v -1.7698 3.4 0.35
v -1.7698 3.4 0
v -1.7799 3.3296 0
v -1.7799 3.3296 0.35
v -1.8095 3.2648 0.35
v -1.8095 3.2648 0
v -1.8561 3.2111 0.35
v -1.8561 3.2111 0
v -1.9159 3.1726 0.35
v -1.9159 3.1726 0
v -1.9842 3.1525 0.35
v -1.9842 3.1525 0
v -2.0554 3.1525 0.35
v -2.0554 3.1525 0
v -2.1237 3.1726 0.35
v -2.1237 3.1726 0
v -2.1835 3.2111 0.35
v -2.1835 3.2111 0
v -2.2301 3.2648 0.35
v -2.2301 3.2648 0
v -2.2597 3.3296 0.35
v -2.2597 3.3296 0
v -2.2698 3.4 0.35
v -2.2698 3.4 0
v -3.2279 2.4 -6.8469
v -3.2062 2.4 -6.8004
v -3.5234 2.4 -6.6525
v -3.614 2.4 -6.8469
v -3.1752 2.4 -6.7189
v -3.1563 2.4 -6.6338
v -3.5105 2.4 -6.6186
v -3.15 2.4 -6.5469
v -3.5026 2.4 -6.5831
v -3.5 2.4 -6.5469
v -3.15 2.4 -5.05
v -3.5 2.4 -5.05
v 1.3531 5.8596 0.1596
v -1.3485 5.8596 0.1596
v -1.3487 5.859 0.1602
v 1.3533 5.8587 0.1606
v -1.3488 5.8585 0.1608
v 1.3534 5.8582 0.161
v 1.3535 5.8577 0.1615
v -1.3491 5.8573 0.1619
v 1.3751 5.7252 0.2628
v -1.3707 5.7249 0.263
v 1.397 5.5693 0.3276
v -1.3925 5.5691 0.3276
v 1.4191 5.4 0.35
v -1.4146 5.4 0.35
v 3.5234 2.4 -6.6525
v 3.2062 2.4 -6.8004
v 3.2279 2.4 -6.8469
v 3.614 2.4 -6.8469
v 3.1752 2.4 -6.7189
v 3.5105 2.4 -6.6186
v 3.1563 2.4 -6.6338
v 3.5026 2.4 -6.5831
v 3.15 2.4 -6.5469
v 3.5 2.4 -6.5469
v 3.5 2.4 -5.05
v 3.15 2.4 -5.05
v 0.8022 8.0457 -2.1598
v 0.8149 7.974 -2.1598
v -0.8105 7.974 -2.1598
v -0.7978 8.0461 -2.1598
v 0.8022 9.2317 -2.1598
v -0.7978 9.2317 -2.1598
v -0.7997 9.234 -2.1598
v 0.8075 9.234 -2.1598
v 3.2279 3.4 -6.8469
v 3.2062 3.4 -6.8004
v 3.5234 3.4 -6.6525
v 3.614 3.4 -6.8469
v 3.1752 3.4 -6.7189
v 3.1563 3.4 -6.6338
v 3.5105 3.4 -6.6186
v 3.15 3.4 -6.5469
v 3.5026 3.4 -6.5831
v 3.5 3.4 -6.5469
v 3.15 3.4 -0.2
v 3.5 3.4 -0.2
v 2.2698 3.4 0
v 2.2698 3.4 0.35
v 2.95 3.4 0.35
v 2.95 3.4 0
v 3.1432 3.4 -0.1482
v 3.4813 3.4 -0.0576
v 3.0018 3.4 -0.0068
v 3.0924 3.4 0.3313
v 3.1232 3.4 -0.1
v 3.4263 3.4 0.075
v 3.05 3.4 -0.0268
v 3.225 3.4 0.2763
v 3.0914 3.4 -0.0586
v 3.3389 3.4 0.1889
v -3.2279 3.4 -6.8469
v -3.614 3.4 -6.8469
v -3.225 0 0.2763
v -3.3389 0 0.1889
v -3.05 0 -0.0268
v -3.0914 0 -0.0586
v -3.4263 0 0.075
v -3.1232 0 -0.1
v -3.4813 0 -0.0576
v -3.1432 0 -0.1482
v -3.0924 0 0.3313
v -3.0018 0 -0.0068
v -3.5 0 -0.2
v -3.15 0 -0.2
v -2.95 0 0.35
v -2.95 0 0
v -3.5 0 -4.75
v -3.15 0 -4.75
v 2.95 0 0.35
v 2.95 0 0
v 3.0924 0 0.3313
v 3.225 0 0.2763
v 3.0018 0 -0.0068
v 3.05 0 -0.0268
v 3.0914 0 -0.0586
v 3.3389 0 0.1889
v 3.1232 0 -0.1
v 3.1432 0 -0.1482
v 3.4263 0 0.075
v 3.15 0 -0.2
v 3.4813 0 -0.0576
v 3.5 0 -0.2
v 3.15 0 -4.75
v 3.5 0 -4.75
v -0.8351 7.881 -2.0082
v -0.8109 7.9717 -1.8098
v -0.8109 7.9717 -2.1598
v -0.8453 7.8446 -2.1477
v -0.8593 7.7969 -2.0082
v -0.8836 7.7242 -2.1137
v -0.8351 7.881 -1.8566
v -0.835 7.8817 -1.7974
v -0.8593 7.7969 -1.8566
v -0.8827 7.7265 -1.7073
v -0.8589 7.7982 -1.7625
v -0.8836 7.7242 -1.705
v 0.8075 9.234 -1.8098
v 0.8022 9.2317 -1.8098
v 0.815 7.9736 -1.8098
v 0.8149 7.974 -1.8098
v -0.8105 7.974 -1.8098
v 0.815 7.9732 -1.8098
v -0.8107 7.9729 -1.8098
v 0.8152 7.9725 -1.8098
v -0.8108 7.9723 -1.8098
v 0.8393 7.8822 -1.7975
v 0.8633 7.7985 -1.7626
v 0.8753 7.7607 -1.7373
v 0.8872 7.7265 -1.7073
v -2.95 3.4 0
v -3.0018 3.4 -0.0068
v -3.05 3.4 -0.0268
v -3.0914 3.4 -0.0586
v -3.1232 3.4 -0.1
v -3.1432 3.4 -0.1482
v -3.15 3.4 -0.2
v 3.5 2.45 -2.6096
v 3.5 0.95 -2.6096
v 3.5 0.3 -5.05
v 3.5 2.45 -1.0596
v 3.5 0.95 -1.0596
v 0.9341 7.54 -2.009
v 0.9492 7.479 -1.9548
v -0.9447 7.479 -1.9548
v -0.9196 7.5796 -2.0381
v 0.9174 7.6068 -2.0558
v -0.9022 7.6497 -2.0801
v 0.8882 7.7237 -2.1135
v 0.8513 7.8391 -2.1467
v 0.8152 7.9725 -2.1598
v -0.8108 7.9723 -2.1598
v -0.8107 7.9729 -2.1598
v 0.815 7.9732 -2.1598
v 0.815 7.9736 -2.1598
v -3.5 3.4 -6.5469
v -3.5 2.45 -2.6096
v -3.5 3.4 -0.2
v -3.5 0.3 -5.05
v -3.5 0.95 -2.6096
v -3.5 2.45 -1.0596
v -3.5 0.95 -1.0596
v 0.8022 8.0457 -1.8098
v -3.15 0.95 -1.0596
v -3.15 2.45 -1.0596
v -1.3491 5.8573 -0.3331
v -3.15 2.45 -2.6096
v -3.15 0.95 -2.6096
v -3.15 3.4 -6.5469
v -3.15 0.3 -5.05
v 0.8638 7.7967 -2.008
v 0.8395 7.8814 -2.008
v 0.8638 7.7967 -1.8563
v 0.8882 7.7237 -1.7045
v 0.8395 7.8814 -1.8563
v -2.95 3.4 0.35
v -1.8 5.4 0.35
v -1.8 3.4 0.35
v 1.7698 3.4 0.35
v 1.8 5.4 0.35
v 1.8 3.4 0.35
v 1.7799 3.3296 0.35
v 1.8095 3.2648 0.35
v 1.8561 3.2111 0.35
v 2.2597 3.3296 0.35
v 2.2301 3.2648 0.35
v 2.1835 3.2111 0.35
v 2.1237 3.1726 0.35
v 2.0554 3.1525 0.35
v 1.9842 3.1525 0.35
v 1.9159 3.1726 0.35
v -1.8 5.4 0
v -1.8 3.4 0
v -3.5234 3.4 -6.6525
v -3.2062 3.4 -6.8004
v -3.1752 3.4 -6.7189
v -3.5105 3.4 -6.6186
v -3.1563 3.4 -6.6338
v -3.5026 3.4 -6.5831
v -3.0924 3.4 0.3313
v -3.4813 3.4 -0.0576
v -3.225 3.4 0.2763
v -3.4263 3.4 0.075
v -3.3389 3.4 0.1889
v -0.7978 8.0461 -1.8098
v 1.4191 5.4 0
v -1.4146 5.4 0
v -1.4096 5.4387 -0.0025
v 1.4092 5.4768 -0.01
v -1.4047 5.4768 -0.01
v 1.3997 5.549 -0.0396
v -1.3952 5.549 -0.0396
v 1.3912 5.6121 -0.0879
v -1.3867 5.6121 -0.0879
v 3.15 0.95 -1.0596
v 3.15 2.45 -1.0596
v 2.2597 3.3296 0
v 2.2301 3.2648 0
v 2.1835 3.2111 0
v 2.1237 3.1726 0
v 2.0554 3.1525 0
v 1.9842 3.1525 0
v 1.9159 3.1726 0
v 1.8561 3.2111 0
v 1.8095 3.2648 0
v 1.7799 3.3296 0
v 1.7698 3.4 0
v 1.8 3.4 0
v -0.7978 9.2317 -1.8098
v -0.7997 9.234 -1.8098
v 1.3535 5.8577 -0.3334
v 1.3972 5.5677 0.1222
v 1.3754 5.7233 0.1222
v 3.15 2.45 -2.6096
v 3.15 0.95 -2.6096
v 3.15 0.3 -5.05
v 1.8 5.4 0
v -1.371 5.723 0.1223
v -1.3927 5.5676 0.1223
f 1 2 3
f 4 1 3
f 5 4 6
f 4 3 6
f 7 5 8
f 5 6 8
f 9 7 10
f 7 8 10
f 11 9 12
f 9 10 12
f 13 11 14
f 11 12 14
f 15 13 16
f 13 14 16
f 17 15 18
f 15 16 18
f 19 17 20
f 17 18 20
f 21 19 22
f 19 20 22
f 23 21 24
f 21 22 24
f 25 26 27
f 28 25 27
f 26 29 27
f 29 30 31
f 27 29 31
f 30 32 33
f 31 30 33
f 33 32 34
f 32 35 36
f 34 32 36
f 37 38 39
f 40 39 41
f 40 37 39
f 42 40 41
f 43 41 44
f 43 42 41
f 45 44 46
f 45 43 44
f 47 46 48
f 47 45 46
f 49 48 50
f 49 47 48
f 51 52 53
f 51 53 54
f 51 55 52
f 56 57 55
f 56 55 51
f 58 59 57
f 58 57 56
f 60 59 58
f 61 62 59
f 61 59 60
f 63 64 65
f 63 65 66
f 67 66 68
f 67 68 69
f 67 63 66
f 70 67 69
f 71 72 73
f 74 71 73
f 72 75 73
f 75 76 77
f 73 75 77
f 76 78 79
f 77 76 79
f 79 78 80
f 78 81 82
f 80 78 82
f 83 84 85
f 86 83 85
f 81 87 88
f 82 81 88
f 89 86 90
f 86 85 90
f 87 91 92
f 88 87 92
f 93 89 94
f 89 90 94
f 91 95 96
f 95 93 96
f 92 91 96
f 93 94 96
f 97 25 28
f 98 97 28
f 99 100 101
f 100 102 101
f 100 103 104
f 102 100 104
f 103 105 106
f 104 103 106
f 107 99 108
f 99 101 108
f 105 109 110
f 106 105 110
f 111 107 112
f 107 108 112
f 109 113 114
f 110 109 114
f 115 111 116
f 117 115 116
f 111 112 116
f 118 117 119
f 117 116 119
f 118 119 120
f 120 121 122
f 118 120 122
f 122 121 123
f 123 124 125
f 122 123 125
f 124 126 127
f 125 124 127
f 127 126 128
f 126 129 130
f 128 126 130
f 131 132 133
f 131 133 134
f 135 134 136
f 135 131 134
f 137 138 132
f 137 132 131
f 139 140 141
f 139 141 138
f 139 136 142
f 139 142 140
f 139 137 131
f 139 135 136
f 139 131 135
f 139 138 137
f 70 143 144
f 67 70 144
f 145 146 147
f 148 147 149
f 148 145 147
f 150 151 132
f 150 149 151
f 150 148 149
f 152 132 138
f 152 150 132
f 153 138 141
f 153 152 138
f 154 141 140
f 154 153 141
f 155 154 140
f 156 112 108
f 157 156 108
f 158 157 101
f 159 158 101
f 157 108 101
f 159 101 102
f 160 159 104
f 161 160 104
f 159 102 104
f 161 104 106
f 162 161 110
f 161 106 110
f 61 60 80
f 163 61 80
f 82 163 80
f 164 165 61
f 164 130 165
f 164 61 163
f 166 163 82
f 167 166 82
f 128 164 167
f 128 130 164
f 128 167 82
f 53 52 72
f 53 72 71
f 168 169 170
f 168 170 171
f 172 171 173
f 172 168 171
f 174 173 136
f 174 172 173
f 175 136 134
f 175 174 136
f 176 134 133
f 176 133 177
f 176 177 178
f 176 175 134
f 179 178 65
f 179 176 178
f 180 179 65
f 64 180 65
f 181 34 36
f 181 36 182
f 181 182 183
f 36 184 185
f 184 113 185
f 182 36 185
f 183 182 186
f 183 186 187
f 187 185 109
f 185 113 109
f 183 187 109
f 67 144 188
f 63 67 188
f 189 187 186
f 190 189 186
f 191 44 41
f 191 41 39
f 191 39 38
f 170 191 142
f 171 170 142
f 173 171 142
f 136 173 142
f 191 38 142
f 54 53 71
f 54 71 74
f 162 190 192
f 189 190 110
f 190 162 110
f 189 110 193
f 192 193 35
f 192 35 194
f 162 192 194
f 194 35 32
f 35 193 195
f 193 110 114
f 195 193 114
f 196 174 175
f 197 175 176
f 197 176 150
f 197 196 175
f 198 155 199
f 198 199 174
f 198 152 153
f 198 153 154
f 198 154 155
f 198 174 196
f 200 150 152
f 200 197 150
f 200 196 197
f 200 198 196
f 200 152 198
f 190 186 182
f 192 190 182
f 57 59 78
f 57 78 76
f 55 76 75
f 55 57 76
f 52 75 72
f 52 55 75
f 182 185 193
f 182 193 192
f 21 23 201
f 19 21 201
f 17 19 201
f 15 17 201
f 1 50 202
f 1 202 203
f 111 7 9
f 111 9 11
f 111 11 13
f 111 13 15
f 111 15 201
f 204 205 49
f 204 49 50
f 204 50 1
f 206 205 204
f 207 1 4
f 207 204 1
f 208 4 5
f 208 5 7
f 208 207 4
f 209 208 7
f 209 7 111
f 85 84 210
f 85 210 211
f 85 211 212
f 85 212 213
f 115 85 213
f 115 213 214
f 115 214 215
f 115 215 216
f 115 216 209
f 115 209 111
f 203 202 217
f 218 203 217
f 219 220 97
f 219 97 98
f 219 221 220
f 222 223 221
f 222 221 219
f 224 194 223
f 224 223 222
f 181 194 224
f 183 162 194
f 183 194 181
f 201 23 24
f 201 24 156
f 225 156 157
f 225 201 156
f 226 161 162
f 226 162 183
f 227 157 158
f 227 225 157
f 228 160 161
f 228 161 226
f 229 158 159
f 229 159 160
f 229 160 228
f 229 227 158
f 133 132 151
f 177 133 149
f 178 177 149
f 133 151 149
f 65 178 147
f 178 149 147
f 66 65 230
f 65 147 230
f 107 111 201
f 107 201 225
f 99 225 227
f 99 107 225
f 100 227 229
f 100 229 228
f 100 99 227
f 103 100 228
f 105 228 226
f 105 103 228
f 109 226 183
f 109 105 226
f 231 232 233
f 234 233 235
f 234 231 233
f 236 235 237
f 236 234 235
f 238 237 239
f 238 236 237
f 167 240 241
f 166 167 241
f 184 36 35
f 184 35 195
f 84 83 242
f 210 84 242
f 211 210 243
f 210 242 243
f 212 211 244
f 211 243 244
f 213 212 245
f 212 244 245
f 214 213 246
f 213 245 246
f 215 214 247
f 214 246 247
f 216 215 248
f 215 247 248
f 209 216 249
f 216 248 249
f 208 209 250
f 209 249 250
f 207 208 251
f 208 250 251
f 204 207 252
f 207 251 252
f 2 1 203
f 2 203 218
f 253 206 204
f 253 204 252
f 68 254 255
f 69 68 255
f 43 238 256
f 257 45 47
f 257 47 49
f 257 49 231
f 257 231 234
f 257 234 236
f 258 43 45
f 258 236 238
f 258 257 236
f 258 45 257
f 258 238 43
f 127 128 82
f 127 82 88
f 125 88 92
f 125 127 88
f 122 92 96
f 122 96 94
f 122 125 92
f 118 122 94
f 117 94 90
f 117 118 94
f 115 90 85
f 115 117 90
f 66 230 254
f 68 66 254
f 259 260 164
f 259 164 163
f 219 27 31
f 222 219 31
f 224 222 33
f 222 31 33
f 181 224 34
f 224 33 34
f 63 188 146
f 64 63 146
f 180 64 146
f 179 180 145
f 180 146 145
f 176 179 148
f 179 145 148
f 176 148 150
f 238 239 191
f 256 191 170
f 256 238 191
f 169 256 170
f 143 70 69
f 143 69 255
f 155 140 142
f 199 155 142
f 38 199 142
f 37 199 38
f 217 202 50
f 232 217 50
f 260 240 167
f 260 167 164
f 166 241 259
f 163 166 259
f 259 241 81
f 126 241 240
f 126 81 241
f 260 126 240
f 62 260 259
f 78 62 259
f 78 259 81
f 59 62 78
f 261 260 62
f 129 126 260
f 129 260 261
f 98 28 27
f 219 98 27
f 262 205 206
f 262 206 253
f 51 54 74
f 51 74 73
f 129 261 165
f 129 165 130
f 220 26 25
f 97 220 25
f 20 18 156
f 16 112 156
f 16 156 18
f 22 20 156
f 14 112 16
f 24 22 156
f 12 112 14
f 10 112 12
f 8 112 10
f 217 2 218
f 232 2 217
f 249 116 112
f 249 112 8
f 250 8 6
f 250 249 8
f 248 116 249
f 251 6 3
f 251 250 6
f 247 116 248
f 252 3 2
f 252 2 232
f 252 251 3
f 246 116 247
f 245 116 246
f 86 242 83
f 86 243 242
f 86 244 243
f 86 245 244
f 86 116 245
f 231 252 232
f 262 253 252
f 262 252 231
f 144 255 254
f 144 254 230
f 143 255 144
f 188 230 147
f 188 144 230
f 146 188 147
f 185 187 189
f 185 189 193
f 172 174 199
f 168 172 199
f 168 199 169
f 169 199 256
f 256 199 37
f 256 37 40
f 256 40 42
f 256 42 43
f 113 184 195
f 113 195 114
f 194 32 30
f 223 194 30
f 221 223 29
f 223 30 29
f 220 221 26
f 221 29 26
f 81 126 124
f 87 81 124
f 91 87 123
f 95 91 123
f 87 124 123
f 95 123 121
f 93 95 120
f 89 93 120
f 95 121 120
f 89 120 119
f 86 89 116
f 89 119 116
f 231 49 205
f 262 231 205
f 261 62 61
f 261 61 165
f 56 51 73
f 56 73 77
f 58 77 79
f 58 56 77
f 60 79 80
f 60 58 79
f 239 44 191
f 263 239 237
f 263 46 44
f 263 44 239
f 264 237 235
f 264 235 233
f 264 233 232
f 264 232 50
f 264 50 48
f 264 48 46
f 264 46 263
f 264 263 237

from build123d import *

# Parameters (mm, degrees)
DODANIE_WYCI_GNI_CIE1_DEPTH     = 0.35
DODANIE_WYCI_GNI_CIE2_DEPTH     = 3.4
WYTNIJ_WYCI_GNI_CIE1_DEPTH      = 12.253852902
WYTNIJ_WYCI_GNI_CIE1_DEPTH_BACK = 12.253852902
SZKIC3_W                        = 1.55
SZKIC3_H                        = 1.5
KONWERTUJ_BRY_1_DEPTH           = 3.4
KONWERTUJ_BRY_1_2_DEPTH         = 3.4
DODANIE_WYCI_GNI_CIE3_DEPTH     = 1
DODANIE_WYCI_GNI_CIE4_START     = -1.7
DODANIE_WYCI_GNI_CIE4_DEPTH     = 3.6
WYTNIJ_WYCI_GNI_CIE2_DEPTH      = 13.252457687


# Read off the part's stored shape, not the designer's step: Konwertuj bryłę1
with BuildPart() as part:
    # Szkic1 → Dodanie-wyciągnięcie1 (new body)
    with BuildSketch(Plane.XY):
        with BuildLine():
            Line((3.5, 0), (3.5, 3.4))
            Line((3.5, 3.4), (3.1, 3.4))
            Line((3.1, 3.4), (2.269798394, 3.4))
            ThreePointArc((2.269798394, 3.4), (2.019798394, 3.15), (1.769798394, 3.4))
            Line((1.769798394, 3.4), (1.417144432, 5.4))
            Line((1.417144432, 5.4), (-1.417144432, 5.4))
            Line((-1.417144432, 5.4), (-1.769798394, 3.4))
            ThreePointArc((-1.769798394, 3.4), (-2.019798394, 3.15), (-2.269798394, 3.4))
            Line((-2.269798394, 3.4), (-3.1, 3.4))
            Line((-3.1, 3.4), (-3.5, 3.4))
            Line((-3.5, 3.4), (-3.5, 0))
            Line((-3.5, 0), (-3.1, 0))
            Line((-3.1, 0), (3.1, 0))
            Line((3.1, 0), (3.5, 0))
        make_face()
    extrude(amount=DODANIE_WYCI_GNI_CIE1_DEPTH)

    # Szkic2 → Dodanie-wyciągnięcie2 (add)
    with BuildSketch(Plane.XZ):
        with BuildLine():
            Line((3.15, -5.046862694), (3.15, -6.546862697))
            ThreePointArc((3.15, -6.546862697), (3.164222396, -6.676726465), (3.206215328, -6.800433654))
            Line((3.206215328, -6.800433654), (3.227865546, -6.846862697))
            Line((3.227865546, -6.846862697), (3.614047818, -6.846862697))
            Line((3.614047818, -6.846862697), (3.523423053, -6.652517262))
            ThreePointArc((3.523423053, -6.652517262), (3.505925998, -6.6009726), (3.5, -6.546862697))
            Line((3.5, -6.546862697), (3.5, -5.046862694))
            Line((3.5, -5.046862694), (3.5, -4.746862694))
            Line((3.5, -4.746862694), (3.5, -0.046862697))
            Line((3.5, -0.046862697), (3.5, 0))
            Line((3.5, 0), (3.15, 0))
            Line((3.15, 0), (3.15, -0.046862697))
            Line((3.15, -0.046862697), (3.15, -4.746862694))
            Line((3.15, -4.746862694), (3.15, -5.046862694))
        make_face()
    dodanie_wyci_gni_cie2 = extrude(amount=-DODANIE_WYCI_GNI_CIE2_DEPTH)

    # Lustro1: Dodanie-wyciągnięcie2 across plane
    add(dodanie_wyci_gni_cie2.mirror(Plane(origin=(0, 0, 0), x_dir=(0, 0, 1), z_dir=(1, 0, 0))))

    # Szkic3 → Wytnij-wyciągnięcie1 (cut, two sides: drawn at the far end of the back side and taken through both)
    with BuildSketch(Plane(origin=(3.5, 0, 0), x_dir=(0, 0, -1), z_dir=(1, 0, 0)).offset(-WYTNIJ_WYCI_GNI_CIE1_DEPTH_BACK)):
        with Locations((1.834568124, 1.7)):
            Rectangle(SZKIC3_W, SZKIC3_H)
        Polygon((6.85, 2.4), (6.655654565, 2.4), (6.55, 2.4), (6.546862697, 2.4), (6.546862697, 0), (4.749999997, 0), (4.618517663, -2.046100673), (8.285753876, -1.25448224), align=None)
        Polygon((6.546862697, 0), (6.546862697, 2.4), (5.049999997, 2.4), (5.049999997, 0.3), (4.749999997, 0), align=None)
    extrude(amount=WYTNIJ_WYCI_GNI_CIE1_DEPTH + WYTNIJ_WYCI_GNI_CIE1_DEPTH_BACK, mode=Mode.SUBTRACT)

    # Konwertuj bryłę1 outline → Konwertuj bryłę1 (cut)
    with BuildSketch(Plane(origin=(0, 0, 0), x_dir=(1, 0, 0), z_dir=(0, 1, 0))):
        with BuildLine():
            Line((3.15, 6.546862697), (3.5, 6.546862697))
            ThreePointArc((3.5, 6.546862697), (3.505925998, 6.6009726), (3.523423053, 6.652517262))
            Line((3.523423053, 6.652517262), (3.614047818, 6.846862697))
            Line((3.614047818, 6.846862697), (3.227865546, 6.846862697))
            Line((3.227865546, 6.846862697), (3.206215328, 6.800433654))
            ThreePointArc((3.206215328, 6.800433654), (3.164222396, 6.676726465), (3.15, 6.546862697))
        make_face()
        with BuildLine():
            Line((3.5, -0.35), (3.5, 0.2))
            ThreePointArc((3.5, 0.2), (3.33890873, -0.18890873), (2.95, -0.35))
            Line((2.95, -0.35), (3.5, -0.35))
        make_face()
        with BuildLine():
            Line((-3.5, -0.35), (-2.95, -0.35))
            ThreePointArc((-2.95, -0.35), (-3.33890873, -0.18890873), (-3.5, 0.2))
            Line((-3.5, 0.2), (-3.5, -0.35))
        make_face()
        with BuildLine():
            ThreePointArc((-3.523423053, 6.652517262), (-3.505925998, 6.6009726), (-3.5, 6.546862697))
            Line((-3.5, 6.546862697), (-3.15, 6.546862697))
            ThreePointArc((-3.15, 6.546862697), (-3.164222396, 6.676726465), (-3.206215328, 6.800433654))
            Line((-3.206215328, 6.800433654), (-3.227865546, 6.846862697))
            Line((-3.227865546, 6.846862697), (-3.614047818, 6.846862697))
            Line((-3.614047818, 6.846862697), (-3.523423053, 6.652517262))
        make_face()
    extrude(amount=KONWERTUJ_BRY_1_DEPTH, mode=Mode.SUBTRACT)

    # Konwertuj bry_1 2 outline → Konwertuj bry_1 2 (add)
    with BuildSketch(Plane(origin=(0, 0, 0), x_dir=(1, 0, 0), z_dir=(0, 1, 0))):
        with BuildLine():
            Line((3.15, 0), (3.15, 0.2))
            ThreePointArc((3.15, 0.2), (3.091421356, 0.058578644), (2.95, 0))
            Line((2.95, 0), (3.15, 0))
        make_face()
        with BuildLine():
            Line((-3.15, 0), (-2.95, 0))
            ThreePointArc((-2.95, 0), (-3.091421356, 0.058578644), (-3.15, 0.2))
            Line((-3.15, 0.2), (-3.15, 0))
        make_face()
    extrude(amount=KONWERTUJ_BRY_1_2_DEPTH)

    # Szkic8 → Dodanie-wyciągnięcie3 (add)
    with BuildSketch(Plane.XZ.offset(-2.4)):
        with BuildLine():
            Line((3.206215328, -6.800433654), (3.227865546, -6.846862697))
            Line((3.227865546, -6.846862697), (3.614047818, -6.846862697))
            Line((3.614047818, -6.846862697), (3.523423053, -6.652517262))
            ThreePointArc((3.523423053, -6.652517262), (3.505925998, -6.6009726), (3.5, -6.546862697))
            Line((3.5, -6.546862697), (3.15, -6.546862697))
            ThreePointArc((3.15, -6.546862697), (3.164222396, -6.676726465), (3.206215328, -6.800433654))
        make_face()
    dodanie_wyci_gni_cie3 = extrude(amount=-DODANIE_WYCI_GNI_CIE3_DEPTH)

    # Lustro2: Dodanie-wyciągnięcie3 across plane
    add(dodanie_wyci_gni_cie3.mirror(Plane(origin=(0, 0, 0), x_dir=(0, 0, 1), z_dir=(1, 0, 0))))

    # Szkic9 → Dodanie-wyciągnięcie4 (add)
    with BuildSketch(Plane(origin=(3.5, 0, 0), x_dir=(0, 0, -1), z_dir=(1, 0, 0)).offset(DODANIE_WYCI_GNI_CIE4_START)):
        with BuildLine():
            Line((2.159795211, 8.048412492), (2.159795211, 9.233988579))
            Line((2.159795211, 9.233988579), (1.809795211, 9.233988579))
            Line((1.809795211, 9.233988579), (1.809795211, 8.048412492))
            Line((1.809795211, 8.048412492), (1.809795211, 7.974008773))
            ThreePointArc((1.809795211, 7.974008773), (1.783153047, 7.840069572), (1.707282584, 7.7265214))
            Line((1.707282584, 7.7265214), (-0.159619408, 5.859619408))
            ThreePointArc((-0.159619408, 5.859619408), (-0.300521696, 5.648744231), (-0.35, 5.4))
            Line((-0.35, 5.4), (-0.35, 3.4))
            Line((-0.35, 3.4), (0, 3.4))
            Line((0, 3.4), (0, 5.4))
            ThreePointArc((0, 5.4), (0.02283614, 5.51480503), (0.087867966, 5.612132034))
            Line((0.087867966, 5.612132034), (1.954769957, 7.479034026))
            ThreePointArc((1.954769957, 7.479034026), (2.106510883, 7.70613037), (2.159795211, 7.974008773))
            Line((2.159795211, 7.974008773), (2.159795211, 8.048412492))
        make_face()
    extrude(amount=-DODANIE_WYCI_GNI_CIE4_DEPTH)

    # Szkic10 → Wytnij-wyciągnięcie2 (cut, through all)
    with BuildSketch(Plane.XY.offset(0.35)):
        with BuildLine():
            Line((-1.8, 5.4), (-1.414602313, 5.4))
            add(Edge.make_bspline(
                [(-1.349117856, 5.857315964), (-1.37109798, 5.736696856), (-1.392626241, 5.570542489), (-1.414602313, 5.4)],
                knots=[0, 0, 0, 0, 0.995518499, 0.995518499, 0.995518499, 0.995518499], degree=3))
            Line((-1.349117856, 5.857315964), (-0.883579694, 7.724217956))
            add(Edge.make_bspline(
                [(-0.810874078, 7.971705329), (-0.835264826, 7.87948746), (-0.859188951, 7.789425824), (-0.883579694, 7.724217956)],
                knots=[0, 0, 0, 0, 1, 1, 1, 1], degree=3))
            Line((-0.810874078, 7.971705329), (-0.797754695, 8.04610905))
            Line((-0.797754695, 8.04610905), (-0.797754695, 9.231685135))
            Line((-0.797754695, 9.231685135), (-0.993203543, 9.461775101))
            Line((-0.993203543, 9.461775101), (-2.257838498, 9.461775101))
            Line((-2.257838498, 9.461775101), (-2.100122127, 3.339055662))
            Line((-2.100122127, 3.339055662), (-1.769812995, 3.397298074))
            ThreePointArc((-1.769812995, 3.397298074), (-1.769802044, 3.398649017), (-1.769798394, 3.4))
            Line((-1.769798394, 3.4), (-1.8, 3.4))
            Line((-1.8, 3.4), (-1.8, 5.4))
        make_face()
        with BuildLine():
            Line((1.8, 5.4), (1.8, 3.47771191))
            Line((1.8, 3.47771191), (2.752350462, 6.206517892))
            Line((2.752350462, 6.206517892), (2.752350462, 10.079155902))
            Line((2.752350462, 10.079155902), (0.802245305, 9.231685135))
            Line((0.802245305, 9.231685135), (0.802245305, 8.04568496))
            Line((0.802245305, 8.04568496), (0.815154302, 7.972474402))
            add(Edge.make_bspline(
                [(0.888230882, 7.723724279), (0.863715686, 7.789264869), (0.839669493, 7.879786029), (0.815154302, 7.972474402)],
                knots=[0, 0, 0, 0, 1, 1, 1, 1], degree=3))
            Line((0.888230882, 7.723724279), (1.353548426, 5.857707011))
            add(Edge.make_bspline(
                [(1.419093822, 5.4), (1.3970978, 5.570696055), (1.375549103, 5.736975116), (1.353548426, 5.857707011)],
                knots=[0.005151663, 0.005151663, 0.005151663, 0.005151663, 1, 1, 1, 1], degree=3))
            Line((1.419093822, 5.4), (1.8, 5.4))
        make_face()
    extrude(amount=-WYTNIJ_WYCI_GNI_CIE2_DEPTH, mode=Mode.SUBTRACT)


solid = part.part
